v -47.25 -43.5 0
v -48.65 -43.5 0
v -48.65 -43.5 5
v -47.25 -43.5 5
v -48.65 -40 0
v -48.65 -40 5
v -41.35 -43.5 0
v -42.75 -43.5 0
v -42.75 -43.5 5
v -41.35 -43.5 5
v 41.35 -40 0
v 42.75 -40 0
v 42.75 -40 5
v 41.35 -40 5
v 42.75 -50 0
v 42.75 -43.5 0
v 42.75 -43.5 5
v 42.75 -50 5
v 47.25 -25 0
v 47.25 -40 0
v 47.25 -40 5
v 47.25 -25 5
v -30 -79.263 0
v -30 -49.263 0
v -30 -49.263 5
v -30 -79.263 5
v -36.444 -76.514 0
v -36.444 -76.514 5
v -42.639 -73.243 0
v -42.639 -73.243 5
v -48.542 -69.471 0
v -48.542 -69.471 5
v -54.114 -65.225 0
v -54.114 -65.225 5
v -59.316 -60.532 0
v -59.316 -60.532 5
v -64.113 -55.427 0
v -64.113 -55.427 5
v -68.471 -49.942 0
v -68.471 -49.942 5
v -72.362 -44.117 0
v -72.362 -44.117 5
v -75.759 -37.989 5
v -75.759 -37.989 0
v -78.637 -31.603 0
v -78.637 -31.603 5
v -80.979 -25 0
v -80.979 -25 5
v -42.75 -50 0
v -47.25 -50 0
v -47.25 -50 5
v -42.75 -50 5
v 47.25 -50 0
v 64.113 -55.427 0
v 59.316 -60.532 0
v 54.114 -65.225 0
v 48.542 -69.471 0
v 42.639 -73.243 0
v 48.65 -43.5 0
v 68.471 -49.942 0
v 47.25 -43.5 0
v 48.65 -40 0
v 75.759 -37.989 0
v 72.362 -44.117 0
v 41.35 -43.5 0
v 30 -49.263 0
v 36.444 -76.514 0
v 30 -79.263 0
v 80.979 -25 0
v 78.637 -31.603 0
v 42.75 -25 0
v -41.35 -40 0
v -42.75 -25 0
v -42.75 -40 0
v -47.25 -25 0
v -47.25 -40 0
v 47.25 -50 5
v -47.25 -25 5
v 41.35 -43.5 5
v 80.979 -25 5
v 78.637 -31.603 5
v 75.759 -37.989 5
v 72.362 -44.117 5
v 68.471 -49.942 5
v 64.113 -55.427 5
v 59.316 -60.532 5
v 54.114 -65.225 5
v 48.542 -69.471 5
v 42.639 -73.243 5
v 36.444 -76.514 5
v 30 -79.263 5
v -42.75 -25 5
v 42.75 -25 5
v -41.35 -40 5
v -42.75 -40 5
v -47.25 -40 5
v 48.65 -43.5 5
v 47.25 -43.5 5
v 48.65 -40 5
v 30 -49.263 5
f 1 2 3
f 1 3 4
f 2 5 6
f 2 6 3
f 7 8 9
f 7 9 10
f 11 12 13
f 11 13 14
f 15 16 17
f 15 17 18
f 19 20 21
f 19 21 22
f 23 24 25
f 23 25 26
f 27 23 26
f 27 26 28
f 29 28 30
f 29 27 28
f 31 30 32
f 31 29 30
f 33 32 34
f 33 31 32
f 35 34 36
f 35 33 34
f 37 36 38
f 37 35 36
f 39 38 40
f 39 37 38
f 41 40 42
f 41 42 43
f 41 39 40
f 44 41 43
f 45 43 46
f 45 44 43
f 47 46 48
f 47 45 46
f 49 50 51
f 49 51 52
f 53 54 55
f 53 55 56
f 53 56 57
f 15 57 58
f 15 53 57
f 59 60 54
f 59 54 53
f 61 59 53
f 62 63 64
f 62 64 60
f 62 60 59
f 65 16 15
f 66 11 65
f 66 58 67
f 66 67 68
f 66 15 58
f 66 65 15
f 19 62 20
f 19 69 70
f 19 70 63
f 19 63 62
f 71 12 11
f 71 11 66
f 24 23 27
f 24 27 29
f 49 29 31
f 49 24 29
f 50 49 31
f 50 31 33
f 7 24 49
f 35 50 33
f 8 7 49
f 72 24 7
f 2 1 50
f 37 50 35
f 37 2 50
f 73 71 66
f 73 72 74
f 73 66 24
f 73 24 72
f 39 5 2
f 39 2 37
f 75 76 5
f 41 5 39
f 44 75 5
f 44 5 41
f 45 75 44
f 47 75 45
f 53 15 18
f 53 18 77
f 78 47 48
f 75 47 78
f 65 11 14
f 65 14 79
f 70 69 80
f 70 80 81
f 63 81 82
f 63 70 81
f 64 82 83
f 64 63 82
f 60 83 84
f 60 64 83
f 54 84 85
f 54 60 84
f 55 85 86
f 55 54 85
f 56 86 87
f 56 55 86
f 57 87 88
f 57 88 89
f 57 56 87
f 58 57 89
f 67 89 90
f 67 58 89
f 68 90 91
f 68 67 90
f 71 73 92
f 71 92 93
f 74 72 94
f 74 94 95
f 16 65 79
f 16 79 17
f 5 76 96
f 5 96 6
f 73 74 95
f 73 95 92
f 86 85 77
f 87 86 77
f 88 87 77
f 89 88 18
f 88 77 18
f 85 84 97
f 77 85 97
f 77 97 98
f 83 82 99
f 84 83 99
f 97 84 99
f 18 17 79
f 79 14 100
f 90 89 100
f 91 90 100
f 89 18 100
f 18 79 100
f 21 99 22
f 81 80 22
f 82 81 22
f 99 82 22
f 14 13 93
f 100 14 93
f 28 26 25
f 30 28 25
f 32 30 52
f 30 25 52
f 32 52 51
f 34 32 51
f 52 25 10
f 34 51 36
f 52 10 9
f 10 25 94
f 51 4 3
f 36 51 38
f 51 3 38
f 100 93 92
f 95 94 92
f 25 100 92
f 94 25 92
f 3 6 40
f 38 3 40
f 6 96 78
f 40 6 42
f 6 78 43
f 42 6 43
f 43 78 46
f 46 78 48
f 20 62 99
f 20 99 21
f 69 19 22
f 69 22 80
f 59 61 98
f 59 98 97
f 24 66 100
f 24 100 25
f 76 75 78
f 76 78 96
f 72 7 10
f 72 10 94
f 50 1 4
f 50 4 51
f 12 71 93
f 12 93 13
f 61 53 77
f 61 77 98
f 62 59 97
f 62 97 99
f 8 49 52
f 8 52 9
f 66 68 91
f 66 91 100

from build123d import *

# Parameters (mm, degrees)
EXTRUDE_1_DEPTH = 5


with BuildPart() as part:
    # 草图1 → 凸台-拉伸1 (new body)
    with BuildSketch(Plane.XY):
        with BuildLine():
            Line((-80.978778084, -25), (-47.25, -25))
            Line((-47.25, -25), (-47.25, -40))
            Line((-47.25, -40), (-48.65, -40))
            Line((-48.65, -40), (-48.65, -43.5))
            Line((-48.65, -43.5), (-47.25, -43.5))
            Line((-47.25, -43.5), (-47.25, -50))
            Line((-47.25, -50), (-42.75, -50))
            Line((-42.75, -50), (-42.75, -43.5))
            Line((-42.75, -43.5), (-41.35, -43.5))
            Line((-41.35, -43.5), (-41.35, -40))
            Line((-41.35, -40), (-42.75, -40))
            Line((-42.75, -40), (-42.75, -25))
            Line((-42.75, -25), (42.75, -25))
            Line((42.75, -25), (42.75, -40))
            Line((42.75, -40), (41.35, -40))
            Line((41.35, -40), (41.35, -43.5))
            Line((41.35, -43.5), (42.75, -43.5))
            Line((42.75, -43.5), (42.75, -50))
            Line((42.75, -50), (47.25, -50))
            Line((47.25, -50), (47.25, -43.5))
            Line((47.25, -43.5), (48.65, -43.5))
            Line((48.65, -43.5), (48.65, -40))
            Line((48.65, -40), (47.25, -40))
            Line((47.25, -40), (47.25, -25))
            Line((47.25, -25), (80.978778084, -25))
            ThreePointArc((80.978778084, -25), (61.76714503, -58.029150389), (30, -79.262617292))
            Line((30, -79.262617292), (30, -49.262617292))
            Line((30, -49.262617292), (-30, -49.262617292))
            Line((-30, -49.262617292), (-30, -79.262617292))
            ThreePointArc((-30, -79.262617292), (-61.76714503, -58.029150389), (-80.978778084, -25))
        make_face()
    extrude(amount=EXTRUDE_1_DEPTH)


solid = part.part
